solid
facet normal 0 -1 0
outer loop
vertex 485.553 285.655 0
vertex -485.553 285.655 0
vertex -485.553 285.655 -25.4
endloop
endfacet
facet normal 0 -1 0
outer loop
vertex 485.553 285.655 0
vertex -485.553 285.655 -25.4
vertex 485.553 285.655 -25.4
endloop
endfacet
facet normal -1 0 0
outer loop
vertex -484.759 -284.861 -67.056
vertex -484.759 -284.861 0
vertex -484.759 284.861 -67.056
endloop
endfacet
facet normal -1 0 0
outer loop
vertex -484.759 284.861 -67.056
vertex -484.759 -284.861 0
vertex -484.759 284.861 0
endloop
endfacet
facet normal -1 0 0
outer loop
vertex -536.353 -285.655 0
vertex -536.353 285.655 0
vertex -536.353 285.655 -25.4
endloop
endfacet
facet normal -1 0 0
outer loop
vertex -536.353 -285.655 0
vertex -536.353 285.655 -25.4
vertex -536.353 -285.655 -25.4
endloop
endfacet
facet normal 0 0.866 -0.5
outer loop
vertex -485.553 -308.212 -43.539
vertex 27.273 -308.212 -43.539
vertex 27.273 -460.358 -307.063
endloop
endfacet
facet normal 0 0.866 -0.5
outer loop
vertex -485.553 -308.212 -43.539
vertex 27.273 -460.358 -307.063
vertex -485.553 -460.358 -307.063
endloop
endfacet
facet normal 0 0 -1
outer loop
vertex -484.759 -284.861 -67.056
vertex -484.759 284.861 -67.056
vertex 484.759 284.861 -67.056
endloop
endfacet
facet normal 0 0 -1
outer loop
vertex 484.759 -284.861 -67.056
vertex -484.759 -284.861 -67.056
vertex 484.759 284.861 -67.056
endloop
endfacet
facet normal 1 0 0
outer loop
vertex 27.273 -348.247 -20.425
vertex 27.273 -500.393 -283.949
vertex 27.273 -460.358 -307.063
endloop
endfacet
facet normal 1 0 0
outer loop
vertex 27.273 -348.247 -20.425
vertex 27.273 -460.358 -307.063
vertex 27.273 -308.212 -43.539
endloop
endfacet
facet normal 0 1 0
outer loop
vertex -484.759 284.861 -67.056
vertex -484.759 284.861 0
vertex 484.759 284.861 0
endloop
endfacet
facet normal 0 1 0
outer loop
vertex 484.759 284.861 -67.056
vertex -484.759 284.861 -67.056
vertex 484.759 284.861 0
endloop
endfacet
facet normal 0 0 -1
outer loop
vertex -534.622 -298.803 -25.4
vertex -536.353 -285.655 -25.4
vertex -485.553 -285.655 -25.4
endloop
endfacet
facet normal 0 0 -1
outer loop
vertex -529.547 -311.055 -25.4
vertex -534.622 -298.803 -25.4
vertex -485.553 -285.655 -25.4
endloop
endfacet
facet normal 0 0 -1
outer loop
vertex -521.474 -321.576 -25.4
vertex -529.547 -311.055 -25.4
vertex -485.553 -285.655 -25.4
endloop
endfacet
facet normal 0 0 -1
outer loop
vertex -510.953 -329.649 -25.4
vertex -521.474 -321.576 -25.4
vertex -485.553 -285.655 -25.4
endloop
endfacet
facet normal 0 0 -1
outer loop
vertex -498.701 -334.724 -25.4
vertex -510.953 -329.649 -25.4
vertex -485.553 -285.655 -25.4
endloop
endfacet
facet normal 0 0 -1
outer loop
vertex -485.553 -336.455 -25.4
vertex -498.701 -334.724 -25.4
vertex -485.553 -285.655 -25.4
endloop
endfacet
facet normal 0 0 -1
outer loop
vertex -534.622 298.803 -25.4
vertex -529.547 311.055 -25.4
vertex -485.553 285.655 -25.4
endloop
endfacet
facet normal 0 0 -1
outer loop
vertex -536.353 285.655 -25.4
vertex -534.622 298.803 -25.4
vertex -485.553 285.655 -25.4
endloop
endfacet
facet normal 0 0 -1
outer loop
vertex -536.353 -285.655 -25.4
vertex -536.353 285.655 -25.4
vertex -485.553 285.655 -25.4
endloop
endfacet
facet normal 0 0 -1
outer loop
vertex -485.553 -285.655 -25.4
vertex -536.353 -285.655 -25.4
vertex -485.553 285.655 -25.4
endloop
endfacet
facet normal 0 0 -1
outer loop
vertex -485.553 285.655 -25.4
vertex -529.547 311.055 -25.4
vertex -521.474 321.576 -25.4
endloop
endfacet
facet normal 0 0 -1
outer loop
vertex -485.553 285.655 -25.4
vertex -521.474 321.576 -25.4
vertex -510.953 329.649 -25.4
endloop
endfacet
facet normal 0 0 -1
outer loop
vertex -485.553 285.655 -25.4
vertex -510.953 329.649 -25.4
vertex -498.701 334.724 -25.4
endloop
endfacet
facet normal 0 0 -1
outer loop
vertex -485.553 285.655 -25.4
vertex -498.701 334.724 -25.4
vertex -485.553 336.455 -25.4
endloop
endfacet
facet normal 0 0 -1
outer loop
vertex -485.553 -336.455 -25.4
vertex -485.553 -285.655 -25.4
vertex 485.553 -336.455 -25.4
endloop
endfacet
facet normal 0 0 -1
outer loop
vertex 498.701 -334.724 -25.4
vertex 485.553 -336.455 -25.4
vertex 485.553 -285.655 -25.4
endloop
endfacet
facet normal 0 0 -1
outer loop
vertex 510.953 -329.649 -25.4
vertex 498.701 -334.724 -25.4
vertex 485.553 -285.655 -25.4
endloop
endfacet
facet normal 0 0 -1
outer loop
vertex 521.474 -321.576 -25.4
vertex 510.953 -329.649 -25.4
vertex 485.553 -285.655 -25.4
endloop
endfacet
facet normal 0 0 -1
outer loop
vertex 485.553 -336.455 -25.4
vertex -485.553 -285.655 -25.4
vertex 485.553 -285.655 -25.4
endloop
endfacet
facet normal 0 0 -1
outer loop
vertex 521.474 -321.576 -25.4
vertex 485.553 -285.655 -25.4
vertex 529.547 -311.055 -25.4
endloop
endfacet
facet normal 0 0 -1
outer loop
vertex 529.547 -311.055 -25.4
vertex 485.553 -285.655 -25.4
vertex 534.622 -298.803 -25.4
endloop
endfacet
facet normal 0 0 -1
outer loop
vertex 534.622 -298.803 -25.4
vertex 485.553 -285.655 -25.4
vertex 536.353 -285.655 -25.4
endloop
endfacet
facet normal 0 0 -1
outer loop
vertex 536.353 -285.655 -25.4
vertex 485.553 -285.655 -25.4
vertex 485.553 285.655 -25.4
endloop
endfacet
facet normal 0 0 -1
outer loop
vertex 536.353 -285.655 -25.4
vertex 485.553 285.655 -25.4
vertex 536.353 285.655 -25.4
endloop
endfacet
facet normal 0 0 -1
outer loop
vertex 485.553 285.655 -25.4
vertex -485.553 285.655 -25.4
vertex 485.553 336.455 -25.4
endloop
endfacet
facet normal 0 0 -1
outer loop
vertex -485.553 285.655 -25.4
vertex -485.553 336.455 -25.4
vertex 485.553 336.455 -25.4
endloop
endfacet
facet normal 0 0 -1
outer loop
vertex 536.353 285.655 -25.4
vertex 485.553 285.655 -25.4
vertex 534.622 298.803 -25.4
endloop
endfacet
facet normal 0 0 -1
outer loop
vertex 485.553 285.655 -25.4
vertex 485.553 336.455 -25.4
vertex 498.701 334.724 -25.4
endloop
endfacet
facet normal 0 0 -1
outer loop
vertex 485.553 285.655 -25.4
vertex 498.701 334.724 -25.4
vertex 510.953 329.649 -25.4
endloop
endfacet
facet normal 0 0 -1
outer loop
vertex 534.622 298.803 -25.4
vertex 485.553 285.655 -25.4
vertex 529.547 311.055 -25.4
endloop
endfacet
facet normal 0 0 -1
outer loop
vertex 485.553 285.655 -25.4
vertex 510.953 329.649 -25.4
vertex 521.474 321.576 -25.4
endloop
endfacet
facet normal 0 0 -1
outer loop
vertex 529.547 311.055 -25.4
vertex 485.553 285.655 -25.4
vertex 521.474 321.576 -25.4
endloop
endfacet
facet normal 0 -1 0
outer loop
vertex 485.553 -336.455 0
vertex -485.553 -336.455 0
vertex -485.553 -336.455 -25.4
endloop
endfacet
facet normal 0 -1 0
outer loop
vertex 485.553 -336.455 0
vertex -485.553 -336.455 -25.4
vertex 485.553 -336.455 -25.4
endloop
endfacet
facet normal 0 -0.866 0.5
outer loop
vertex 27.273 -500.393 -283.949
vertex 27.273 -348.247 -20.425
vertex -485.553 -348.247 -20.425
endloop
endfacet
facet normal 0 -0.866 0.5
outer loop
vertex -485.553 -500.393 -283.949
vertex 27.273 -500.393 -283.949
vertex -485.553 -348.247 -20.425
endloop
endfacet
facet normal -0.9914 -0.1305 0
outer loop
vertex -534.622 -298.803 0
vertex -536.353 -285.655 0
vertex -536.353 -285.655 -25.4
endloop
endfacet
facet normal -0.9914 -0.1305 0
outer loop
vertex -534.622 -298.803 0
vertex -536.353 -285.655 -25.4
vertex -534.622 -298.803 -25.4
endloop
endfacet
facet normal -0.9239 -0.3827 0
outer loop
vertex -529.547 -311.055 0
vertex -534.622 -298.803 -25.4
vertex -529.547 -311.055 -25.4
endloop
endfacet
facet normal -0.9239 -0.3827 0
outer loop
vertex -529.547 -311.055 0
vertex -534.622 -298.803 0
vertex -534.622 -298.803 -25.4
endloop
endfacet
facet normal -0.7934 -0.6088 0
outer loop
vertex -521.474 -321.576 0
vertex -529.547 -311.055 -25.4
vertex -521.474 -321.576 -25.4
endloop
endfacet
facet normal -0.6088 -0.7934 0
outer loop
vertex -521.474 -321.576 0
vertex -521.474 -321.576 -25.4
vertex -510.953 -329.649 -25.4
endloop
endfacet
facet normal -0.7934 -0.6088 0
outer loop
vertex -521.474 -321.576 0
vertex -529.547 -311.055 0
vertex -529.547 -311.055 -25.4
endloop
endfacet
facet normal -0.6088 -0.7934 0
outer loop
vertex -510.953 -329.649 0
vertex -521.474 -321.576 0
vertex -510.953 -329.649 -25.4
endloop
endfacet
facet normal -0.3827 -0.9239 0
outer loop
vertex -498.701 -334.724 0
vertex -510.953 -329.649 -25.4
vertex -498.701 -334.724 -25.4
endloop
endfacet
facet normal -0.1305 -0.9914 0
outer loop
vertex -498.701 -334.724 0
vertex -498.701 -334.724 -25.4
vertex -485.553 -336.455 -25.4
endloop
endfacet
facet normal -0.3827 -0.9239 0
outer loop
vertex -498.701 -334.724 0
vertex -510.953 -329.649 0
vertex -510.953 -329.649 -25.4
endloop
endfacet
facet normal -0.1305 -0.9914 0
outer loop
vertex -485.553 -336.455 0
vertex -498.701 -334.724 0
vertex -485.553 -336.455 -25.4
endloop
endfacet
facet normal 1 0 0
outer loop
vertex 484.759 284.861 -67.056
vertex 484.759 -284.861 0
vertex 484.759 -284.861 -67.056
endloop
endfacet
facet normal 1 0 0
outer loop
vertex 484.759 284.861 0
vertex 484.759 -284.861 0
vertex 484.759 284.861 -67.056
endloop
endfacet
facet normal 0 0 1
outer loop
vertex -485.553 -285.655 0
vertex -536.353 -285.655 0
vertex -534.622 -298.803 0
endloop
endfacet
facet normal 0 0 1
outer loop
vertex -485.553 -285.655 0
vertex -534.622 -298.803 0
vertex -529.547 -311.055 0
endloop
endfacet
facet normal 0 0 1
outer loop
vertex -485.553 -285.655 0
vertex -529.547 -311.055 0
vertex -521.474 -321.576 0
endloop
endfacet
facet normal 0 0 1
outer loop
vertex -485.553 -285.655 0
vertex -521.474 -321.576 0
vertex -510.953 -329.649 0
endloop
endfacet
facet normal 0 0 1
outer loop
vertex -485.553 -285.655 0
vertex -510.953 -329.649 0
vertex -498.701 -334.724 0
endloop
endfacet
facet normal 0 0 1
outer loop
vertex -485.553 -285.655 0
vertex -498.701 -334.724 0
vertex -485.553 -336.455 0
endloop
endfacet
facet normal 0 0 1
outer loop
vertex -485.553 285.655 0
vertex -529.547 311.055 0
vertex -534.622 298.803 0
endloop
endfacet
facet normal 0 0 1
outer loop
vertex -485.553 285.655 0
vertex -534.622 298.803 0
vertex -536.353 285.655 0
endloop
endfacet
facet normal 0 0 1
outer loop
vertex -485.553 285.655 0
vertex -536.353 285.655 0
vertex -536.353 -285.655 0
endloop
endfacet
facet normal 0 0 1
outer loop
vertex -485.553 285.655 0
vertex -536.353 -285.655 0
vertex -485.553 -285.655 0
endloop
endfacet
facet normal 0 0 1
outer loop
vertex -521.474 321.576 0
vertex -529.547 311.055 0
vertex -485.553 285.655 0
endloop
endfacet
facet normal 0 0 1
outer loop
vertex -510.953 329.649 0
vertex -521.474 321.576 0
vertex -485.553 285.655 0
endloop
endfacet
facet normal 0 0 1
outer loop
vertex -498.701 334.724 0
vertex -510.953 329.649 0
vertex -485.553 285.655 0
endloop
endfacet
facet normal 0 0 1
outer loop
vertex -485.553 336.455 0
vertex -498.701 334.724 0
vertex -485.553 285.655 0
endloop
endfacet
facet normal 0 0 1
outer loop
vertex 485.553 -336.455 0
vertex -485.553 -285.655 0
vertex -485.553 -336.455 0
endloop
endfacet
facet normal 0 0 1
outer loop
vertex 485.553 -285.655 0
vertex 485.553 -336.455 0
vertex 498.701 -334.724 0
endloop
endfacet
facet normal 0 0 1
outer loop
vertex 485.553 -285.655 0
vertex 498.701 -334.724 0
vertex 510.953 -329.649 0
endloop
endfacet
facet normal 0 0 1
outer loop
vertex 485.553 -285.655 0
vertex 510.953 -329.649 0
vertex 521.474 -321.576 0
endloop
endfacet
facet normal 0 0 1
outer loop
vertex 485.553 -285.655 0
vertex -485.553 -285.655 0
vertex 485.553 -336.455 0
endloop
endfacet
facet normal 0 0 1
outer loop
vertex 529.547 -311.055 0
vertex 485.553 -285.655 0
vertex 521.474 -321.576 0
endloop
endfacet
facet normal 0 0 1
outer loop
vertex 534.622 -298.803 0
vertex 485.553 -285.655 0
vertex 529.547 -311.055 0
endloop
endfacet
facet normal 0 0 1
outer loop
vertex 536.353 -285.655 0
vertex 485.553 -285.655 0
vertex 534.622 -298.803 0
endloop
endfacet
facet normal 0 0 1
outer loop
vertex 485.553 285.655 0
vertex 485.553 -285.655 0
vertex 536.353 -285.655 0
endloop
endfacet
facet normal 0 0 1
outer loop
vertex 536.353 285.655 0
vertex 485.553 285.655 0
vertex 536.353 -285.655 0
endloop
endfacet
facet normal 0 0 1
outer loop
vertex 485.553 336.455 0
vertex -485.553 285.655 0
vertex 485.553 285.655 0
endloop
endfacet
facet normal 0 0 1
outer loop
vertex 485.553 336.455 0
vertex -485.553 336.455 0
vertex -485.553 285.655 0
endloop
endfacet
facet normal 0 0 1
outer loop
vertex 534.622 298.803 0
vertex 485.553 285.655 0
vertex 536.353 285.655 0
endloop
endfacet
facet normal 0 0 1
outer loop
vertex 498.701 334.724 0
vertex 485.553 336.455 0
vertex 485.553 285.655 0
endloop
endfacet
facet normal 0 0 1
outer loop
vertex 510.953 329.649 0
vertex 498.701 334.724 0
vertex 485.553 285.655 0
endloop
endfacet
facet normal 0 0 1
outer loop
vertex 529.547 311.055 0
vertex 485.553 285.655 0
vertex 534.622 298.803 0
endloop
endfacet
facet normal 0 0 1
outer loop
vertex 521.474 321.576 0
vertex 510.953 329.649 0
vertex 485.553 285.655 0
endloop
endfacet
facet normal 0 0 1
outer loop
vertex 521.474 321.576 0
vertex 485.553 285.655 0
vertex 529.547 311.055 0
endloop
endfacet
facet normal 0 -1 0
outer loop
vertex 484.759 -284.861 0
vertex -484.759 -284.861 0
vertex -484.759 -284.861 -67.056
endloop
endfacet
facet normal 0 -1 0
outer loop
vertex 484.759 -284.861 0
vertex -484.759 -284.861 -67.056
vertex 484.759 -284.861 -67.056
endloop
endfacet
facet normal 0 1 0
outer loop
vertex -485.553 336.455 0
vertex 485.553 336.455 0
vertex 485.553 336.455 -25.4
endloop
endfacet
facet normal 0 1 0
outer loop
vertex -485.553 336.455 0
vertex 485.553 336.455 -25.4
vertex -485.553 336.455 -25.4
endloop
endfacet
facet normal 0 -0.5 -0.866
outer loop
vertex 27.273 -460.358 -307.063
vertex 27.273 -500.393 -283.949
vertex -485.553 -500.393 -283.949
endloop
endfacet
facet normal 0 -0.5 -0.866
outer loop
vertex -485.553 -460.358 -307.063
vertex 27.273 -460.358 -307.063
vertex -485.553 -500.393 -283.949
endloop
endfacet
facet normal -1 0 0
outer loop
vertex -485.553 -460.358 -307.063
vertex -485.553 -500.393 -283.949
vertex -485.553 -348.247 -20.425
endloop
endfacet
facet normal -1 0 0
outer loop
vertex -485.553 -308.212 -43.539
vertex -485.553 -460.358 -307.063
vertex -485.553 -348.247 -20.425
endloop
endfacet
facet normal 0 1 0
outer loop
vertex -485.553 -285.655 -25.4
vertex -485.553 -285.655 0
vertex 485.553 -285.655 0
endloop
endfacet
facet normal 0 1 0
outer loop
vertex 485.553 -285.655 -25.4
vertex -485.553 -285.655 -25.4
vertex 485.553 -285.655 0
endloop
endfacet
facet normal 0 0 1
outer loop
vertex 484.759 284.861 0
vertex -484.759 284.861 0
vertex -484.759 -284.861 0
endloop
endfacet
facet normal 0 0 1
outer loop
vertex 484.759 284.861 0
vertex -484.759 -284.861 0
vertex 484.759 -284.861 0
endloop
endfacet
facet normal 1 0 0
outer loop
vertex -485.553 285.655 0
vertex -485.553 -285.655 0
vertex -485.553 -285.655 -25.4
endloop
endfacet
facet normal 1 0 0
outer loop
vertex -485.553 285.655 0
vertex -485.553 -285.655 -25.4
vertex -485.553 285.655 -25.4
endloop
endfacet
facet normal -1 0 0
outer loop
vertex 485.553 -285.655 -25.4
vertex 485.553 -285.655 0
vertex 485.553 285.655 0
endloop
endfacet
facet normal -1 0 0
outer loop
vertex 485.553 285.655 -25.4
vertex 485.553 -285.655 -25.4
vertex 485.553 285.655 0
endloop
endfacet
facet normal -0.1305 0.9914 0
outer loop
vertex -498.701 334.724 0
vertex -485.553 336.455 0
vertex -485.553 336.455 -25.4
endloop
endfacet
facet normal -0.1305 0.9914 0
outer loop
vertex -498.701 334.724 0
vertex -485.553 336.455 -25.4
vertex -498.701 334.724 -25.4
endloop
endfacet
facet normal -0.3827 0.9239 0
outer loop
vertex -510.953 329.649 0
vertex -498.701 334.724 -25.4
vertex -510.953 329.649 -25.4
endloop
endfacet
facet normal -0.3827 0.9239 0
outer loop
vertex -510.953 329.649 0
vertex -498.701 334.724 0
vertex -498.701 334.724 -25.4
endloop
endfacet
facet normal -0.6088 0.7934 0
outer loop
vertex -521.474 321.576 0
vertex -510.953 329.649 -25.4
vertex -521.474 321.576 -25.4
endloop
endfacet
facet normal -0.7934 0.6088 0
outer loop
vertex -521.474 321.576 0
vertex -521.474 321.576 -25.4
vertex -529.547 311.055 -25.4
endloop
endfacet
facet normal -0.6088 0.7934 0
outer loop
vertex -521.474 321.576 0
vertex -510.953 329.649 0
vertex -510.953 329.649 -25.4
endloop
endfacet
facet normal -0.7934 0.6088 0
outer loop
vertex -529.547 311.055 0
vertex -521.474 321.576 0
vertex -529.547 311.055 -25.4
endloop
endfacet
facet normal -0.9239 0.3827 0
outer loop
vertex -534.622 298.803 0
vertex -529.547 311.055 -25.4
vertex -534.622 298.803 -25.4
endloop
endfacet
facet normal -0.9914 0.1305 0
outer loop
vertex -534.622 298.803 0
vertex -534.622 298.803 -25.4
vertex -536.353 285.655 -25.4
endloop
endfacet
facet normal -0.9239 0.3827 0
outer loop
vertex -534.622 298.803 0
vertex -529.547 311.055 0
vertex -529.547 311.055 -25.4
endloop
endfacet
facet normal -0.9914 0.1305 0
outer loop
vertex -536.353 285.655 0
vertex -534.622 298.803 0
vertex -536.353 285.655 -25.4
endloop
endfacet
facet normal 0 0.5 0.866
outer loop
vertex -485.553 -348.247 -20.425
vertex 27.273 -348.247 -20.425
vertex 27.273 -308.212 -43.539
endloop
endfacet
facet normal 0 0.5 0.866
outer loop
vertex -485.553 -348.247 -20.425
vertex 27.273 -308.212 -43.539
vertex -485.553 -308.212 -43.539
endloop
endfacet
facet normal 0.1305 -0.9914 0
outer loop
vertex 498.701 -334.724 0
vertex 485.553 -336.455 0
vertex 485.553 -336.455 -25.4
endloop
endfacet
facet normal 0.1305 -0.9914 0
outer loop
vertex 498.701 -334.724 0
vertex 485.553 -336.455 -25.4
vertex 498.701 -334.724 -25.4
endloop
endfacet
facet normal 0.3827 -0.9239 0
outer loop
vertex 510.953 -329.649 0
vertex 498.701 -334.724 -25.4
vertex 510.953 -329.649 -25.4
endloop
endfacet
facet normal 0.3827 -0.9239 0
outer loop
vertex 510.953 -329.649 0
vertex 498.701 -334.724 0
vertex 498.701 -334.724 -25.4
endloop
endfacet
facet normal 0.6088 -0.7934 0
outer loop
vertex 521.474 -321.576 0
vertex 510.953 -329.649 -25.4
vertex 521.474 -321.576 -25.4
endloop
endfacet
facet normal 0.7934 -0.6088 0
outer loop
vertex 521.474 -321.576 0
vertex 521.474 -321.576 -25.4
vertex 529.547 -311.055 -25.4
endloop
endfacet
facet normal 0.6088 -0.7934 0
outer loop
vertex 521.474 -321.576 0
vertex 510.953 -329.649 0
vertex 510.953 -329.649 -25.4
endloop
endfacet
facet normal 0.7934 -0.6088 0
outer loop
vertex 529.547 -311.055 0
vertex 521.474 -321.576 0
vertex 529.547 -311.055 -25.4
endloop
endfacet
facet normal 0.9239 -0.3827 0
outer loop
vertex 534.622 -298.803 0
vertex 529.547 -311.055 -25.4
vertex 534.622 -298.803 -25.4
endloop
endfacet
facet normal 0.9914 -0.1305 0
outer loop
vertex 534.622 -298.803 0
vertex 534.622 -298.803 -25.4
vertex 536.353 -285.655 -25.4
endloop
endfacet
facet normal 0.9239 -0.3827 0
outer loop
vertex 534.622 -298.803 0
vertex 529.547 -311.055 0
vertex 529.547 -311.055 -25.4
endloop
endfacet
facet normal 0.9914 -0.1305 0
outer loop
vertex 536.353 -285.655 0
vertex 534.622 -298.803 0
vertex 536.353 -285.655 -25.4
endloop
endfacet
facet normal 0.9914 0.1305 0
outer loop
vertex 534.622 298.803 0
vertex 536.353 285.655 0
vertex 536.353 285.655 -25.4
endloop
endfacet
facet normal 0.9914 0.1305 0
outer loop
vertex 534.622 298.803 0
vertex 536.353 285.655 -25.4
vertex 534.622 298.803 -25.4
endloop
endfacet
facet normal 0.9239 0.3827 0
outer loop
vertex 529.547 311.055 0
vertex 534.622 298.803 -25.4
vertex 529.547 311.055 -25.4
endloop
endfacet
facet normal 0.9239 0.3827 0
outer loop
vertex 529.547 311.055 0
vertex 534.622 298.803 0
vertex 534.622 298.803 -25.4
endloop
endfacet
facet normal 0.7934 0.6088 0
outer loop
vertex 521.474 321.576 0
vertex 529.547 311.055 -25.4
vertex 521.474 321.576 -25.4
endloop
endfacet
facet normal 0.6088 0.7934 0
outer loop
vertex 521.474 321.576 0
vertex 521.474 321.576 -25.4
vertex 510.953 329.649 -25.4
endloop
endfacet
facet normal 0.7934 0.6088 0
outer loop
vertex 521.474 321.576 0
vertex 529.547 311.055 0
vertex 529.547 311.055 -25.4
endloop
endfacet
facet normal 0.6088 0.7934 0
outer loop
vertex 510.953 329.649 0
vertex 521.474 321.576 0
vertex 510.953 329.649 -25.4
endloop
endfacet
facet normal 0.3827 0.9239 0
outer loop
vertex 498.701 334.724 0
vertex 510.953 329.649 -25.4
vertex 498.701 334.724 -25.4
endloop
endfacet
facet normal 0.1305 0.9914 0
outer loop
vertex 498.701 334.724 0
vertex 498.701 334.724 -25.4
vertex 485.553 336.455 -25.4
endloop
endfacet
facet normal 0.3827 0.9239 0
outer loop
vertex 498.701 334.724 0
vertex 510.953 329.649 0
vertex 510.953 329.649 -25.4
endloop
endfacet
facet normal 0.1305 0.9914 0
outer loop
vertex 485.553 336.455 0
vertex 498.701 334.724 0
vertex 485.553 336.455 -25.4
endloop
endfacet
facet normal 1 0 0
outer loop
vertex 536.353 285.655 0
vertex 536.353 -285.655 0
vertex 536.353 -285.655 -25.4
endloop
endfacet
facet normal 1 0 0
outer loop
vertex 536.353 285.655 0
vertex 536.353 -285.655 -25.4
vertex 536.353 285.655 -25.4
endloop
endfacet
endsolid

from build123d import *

# Parameters (mm, degrees)
F0_W     = 969.518
F0_H     = 569.722
F1_DEPTH = 67.056
F2_W     = 971.1055
F2_H     = 571.3095
F3_DEPTH = 25.4
F5_W     = 512.826
F5_H     = 304.292
F6_DEPTH = 46.228


with BuildPart() as f1:
    # F0 (on Top) → F1 (new body)
    with BuildSketch(Plane.XY):
        Rectangle(F0_W, F0_H)
    extrude(amount=-F1_DEPTH)


with BuildPart() as f3:
    # F2 (on Top) → F3 (new body)
    with BuildSketch(Plane.XY):
        with BuildLine():
            ThreePointArc((536.35275, 285.65475), (521.473774, 321.575774), (485.55275, 336.45475))
            Line((485.55275, 336.45475), (-485.55275, 336.45475))
            ThreePointArc((-485.55275, 336.45475), (-521.473774, 321.575774), (-536.35275, 285.65475))
            Line((-536.35275, 285.65475), (-536.35275, -285.65475))
            ThreePointArc((-536.35275, -285.65475), (-521.473774, -321.575774), (-485.55275, -336.45475))
            Line((-485.55275, -336.45475), (485.55275, -336.45475))
            ThreePointArc((485.55275, -336.45475), (521.473774, -321.575774), (536.35275, -285.65475))
            Line((536.35275, -285.65475), (536.35275, 285.65475))
        make_face()
        Rectangle(F2_W, F2_H, mode=Mode.SUBTRACT)
    extrude(amount=-F3_DEPTH)


with BuildPart() as f6:
    # F5 (on face) → F6 (new body)
    with BuildSketch(Plane(origin=(0, -252.341063, 145.68918), x_dir=(-1, 0, 0), z_dir=(0, 0.866025, -0.5))):
        with Locations((229.13975, -343.95792)):
            Rectangle(F5_W, F5_H)
    extrude(amount=F6_DEPTH)


solid = Compound([f1.part, f3.part, f6.part])
